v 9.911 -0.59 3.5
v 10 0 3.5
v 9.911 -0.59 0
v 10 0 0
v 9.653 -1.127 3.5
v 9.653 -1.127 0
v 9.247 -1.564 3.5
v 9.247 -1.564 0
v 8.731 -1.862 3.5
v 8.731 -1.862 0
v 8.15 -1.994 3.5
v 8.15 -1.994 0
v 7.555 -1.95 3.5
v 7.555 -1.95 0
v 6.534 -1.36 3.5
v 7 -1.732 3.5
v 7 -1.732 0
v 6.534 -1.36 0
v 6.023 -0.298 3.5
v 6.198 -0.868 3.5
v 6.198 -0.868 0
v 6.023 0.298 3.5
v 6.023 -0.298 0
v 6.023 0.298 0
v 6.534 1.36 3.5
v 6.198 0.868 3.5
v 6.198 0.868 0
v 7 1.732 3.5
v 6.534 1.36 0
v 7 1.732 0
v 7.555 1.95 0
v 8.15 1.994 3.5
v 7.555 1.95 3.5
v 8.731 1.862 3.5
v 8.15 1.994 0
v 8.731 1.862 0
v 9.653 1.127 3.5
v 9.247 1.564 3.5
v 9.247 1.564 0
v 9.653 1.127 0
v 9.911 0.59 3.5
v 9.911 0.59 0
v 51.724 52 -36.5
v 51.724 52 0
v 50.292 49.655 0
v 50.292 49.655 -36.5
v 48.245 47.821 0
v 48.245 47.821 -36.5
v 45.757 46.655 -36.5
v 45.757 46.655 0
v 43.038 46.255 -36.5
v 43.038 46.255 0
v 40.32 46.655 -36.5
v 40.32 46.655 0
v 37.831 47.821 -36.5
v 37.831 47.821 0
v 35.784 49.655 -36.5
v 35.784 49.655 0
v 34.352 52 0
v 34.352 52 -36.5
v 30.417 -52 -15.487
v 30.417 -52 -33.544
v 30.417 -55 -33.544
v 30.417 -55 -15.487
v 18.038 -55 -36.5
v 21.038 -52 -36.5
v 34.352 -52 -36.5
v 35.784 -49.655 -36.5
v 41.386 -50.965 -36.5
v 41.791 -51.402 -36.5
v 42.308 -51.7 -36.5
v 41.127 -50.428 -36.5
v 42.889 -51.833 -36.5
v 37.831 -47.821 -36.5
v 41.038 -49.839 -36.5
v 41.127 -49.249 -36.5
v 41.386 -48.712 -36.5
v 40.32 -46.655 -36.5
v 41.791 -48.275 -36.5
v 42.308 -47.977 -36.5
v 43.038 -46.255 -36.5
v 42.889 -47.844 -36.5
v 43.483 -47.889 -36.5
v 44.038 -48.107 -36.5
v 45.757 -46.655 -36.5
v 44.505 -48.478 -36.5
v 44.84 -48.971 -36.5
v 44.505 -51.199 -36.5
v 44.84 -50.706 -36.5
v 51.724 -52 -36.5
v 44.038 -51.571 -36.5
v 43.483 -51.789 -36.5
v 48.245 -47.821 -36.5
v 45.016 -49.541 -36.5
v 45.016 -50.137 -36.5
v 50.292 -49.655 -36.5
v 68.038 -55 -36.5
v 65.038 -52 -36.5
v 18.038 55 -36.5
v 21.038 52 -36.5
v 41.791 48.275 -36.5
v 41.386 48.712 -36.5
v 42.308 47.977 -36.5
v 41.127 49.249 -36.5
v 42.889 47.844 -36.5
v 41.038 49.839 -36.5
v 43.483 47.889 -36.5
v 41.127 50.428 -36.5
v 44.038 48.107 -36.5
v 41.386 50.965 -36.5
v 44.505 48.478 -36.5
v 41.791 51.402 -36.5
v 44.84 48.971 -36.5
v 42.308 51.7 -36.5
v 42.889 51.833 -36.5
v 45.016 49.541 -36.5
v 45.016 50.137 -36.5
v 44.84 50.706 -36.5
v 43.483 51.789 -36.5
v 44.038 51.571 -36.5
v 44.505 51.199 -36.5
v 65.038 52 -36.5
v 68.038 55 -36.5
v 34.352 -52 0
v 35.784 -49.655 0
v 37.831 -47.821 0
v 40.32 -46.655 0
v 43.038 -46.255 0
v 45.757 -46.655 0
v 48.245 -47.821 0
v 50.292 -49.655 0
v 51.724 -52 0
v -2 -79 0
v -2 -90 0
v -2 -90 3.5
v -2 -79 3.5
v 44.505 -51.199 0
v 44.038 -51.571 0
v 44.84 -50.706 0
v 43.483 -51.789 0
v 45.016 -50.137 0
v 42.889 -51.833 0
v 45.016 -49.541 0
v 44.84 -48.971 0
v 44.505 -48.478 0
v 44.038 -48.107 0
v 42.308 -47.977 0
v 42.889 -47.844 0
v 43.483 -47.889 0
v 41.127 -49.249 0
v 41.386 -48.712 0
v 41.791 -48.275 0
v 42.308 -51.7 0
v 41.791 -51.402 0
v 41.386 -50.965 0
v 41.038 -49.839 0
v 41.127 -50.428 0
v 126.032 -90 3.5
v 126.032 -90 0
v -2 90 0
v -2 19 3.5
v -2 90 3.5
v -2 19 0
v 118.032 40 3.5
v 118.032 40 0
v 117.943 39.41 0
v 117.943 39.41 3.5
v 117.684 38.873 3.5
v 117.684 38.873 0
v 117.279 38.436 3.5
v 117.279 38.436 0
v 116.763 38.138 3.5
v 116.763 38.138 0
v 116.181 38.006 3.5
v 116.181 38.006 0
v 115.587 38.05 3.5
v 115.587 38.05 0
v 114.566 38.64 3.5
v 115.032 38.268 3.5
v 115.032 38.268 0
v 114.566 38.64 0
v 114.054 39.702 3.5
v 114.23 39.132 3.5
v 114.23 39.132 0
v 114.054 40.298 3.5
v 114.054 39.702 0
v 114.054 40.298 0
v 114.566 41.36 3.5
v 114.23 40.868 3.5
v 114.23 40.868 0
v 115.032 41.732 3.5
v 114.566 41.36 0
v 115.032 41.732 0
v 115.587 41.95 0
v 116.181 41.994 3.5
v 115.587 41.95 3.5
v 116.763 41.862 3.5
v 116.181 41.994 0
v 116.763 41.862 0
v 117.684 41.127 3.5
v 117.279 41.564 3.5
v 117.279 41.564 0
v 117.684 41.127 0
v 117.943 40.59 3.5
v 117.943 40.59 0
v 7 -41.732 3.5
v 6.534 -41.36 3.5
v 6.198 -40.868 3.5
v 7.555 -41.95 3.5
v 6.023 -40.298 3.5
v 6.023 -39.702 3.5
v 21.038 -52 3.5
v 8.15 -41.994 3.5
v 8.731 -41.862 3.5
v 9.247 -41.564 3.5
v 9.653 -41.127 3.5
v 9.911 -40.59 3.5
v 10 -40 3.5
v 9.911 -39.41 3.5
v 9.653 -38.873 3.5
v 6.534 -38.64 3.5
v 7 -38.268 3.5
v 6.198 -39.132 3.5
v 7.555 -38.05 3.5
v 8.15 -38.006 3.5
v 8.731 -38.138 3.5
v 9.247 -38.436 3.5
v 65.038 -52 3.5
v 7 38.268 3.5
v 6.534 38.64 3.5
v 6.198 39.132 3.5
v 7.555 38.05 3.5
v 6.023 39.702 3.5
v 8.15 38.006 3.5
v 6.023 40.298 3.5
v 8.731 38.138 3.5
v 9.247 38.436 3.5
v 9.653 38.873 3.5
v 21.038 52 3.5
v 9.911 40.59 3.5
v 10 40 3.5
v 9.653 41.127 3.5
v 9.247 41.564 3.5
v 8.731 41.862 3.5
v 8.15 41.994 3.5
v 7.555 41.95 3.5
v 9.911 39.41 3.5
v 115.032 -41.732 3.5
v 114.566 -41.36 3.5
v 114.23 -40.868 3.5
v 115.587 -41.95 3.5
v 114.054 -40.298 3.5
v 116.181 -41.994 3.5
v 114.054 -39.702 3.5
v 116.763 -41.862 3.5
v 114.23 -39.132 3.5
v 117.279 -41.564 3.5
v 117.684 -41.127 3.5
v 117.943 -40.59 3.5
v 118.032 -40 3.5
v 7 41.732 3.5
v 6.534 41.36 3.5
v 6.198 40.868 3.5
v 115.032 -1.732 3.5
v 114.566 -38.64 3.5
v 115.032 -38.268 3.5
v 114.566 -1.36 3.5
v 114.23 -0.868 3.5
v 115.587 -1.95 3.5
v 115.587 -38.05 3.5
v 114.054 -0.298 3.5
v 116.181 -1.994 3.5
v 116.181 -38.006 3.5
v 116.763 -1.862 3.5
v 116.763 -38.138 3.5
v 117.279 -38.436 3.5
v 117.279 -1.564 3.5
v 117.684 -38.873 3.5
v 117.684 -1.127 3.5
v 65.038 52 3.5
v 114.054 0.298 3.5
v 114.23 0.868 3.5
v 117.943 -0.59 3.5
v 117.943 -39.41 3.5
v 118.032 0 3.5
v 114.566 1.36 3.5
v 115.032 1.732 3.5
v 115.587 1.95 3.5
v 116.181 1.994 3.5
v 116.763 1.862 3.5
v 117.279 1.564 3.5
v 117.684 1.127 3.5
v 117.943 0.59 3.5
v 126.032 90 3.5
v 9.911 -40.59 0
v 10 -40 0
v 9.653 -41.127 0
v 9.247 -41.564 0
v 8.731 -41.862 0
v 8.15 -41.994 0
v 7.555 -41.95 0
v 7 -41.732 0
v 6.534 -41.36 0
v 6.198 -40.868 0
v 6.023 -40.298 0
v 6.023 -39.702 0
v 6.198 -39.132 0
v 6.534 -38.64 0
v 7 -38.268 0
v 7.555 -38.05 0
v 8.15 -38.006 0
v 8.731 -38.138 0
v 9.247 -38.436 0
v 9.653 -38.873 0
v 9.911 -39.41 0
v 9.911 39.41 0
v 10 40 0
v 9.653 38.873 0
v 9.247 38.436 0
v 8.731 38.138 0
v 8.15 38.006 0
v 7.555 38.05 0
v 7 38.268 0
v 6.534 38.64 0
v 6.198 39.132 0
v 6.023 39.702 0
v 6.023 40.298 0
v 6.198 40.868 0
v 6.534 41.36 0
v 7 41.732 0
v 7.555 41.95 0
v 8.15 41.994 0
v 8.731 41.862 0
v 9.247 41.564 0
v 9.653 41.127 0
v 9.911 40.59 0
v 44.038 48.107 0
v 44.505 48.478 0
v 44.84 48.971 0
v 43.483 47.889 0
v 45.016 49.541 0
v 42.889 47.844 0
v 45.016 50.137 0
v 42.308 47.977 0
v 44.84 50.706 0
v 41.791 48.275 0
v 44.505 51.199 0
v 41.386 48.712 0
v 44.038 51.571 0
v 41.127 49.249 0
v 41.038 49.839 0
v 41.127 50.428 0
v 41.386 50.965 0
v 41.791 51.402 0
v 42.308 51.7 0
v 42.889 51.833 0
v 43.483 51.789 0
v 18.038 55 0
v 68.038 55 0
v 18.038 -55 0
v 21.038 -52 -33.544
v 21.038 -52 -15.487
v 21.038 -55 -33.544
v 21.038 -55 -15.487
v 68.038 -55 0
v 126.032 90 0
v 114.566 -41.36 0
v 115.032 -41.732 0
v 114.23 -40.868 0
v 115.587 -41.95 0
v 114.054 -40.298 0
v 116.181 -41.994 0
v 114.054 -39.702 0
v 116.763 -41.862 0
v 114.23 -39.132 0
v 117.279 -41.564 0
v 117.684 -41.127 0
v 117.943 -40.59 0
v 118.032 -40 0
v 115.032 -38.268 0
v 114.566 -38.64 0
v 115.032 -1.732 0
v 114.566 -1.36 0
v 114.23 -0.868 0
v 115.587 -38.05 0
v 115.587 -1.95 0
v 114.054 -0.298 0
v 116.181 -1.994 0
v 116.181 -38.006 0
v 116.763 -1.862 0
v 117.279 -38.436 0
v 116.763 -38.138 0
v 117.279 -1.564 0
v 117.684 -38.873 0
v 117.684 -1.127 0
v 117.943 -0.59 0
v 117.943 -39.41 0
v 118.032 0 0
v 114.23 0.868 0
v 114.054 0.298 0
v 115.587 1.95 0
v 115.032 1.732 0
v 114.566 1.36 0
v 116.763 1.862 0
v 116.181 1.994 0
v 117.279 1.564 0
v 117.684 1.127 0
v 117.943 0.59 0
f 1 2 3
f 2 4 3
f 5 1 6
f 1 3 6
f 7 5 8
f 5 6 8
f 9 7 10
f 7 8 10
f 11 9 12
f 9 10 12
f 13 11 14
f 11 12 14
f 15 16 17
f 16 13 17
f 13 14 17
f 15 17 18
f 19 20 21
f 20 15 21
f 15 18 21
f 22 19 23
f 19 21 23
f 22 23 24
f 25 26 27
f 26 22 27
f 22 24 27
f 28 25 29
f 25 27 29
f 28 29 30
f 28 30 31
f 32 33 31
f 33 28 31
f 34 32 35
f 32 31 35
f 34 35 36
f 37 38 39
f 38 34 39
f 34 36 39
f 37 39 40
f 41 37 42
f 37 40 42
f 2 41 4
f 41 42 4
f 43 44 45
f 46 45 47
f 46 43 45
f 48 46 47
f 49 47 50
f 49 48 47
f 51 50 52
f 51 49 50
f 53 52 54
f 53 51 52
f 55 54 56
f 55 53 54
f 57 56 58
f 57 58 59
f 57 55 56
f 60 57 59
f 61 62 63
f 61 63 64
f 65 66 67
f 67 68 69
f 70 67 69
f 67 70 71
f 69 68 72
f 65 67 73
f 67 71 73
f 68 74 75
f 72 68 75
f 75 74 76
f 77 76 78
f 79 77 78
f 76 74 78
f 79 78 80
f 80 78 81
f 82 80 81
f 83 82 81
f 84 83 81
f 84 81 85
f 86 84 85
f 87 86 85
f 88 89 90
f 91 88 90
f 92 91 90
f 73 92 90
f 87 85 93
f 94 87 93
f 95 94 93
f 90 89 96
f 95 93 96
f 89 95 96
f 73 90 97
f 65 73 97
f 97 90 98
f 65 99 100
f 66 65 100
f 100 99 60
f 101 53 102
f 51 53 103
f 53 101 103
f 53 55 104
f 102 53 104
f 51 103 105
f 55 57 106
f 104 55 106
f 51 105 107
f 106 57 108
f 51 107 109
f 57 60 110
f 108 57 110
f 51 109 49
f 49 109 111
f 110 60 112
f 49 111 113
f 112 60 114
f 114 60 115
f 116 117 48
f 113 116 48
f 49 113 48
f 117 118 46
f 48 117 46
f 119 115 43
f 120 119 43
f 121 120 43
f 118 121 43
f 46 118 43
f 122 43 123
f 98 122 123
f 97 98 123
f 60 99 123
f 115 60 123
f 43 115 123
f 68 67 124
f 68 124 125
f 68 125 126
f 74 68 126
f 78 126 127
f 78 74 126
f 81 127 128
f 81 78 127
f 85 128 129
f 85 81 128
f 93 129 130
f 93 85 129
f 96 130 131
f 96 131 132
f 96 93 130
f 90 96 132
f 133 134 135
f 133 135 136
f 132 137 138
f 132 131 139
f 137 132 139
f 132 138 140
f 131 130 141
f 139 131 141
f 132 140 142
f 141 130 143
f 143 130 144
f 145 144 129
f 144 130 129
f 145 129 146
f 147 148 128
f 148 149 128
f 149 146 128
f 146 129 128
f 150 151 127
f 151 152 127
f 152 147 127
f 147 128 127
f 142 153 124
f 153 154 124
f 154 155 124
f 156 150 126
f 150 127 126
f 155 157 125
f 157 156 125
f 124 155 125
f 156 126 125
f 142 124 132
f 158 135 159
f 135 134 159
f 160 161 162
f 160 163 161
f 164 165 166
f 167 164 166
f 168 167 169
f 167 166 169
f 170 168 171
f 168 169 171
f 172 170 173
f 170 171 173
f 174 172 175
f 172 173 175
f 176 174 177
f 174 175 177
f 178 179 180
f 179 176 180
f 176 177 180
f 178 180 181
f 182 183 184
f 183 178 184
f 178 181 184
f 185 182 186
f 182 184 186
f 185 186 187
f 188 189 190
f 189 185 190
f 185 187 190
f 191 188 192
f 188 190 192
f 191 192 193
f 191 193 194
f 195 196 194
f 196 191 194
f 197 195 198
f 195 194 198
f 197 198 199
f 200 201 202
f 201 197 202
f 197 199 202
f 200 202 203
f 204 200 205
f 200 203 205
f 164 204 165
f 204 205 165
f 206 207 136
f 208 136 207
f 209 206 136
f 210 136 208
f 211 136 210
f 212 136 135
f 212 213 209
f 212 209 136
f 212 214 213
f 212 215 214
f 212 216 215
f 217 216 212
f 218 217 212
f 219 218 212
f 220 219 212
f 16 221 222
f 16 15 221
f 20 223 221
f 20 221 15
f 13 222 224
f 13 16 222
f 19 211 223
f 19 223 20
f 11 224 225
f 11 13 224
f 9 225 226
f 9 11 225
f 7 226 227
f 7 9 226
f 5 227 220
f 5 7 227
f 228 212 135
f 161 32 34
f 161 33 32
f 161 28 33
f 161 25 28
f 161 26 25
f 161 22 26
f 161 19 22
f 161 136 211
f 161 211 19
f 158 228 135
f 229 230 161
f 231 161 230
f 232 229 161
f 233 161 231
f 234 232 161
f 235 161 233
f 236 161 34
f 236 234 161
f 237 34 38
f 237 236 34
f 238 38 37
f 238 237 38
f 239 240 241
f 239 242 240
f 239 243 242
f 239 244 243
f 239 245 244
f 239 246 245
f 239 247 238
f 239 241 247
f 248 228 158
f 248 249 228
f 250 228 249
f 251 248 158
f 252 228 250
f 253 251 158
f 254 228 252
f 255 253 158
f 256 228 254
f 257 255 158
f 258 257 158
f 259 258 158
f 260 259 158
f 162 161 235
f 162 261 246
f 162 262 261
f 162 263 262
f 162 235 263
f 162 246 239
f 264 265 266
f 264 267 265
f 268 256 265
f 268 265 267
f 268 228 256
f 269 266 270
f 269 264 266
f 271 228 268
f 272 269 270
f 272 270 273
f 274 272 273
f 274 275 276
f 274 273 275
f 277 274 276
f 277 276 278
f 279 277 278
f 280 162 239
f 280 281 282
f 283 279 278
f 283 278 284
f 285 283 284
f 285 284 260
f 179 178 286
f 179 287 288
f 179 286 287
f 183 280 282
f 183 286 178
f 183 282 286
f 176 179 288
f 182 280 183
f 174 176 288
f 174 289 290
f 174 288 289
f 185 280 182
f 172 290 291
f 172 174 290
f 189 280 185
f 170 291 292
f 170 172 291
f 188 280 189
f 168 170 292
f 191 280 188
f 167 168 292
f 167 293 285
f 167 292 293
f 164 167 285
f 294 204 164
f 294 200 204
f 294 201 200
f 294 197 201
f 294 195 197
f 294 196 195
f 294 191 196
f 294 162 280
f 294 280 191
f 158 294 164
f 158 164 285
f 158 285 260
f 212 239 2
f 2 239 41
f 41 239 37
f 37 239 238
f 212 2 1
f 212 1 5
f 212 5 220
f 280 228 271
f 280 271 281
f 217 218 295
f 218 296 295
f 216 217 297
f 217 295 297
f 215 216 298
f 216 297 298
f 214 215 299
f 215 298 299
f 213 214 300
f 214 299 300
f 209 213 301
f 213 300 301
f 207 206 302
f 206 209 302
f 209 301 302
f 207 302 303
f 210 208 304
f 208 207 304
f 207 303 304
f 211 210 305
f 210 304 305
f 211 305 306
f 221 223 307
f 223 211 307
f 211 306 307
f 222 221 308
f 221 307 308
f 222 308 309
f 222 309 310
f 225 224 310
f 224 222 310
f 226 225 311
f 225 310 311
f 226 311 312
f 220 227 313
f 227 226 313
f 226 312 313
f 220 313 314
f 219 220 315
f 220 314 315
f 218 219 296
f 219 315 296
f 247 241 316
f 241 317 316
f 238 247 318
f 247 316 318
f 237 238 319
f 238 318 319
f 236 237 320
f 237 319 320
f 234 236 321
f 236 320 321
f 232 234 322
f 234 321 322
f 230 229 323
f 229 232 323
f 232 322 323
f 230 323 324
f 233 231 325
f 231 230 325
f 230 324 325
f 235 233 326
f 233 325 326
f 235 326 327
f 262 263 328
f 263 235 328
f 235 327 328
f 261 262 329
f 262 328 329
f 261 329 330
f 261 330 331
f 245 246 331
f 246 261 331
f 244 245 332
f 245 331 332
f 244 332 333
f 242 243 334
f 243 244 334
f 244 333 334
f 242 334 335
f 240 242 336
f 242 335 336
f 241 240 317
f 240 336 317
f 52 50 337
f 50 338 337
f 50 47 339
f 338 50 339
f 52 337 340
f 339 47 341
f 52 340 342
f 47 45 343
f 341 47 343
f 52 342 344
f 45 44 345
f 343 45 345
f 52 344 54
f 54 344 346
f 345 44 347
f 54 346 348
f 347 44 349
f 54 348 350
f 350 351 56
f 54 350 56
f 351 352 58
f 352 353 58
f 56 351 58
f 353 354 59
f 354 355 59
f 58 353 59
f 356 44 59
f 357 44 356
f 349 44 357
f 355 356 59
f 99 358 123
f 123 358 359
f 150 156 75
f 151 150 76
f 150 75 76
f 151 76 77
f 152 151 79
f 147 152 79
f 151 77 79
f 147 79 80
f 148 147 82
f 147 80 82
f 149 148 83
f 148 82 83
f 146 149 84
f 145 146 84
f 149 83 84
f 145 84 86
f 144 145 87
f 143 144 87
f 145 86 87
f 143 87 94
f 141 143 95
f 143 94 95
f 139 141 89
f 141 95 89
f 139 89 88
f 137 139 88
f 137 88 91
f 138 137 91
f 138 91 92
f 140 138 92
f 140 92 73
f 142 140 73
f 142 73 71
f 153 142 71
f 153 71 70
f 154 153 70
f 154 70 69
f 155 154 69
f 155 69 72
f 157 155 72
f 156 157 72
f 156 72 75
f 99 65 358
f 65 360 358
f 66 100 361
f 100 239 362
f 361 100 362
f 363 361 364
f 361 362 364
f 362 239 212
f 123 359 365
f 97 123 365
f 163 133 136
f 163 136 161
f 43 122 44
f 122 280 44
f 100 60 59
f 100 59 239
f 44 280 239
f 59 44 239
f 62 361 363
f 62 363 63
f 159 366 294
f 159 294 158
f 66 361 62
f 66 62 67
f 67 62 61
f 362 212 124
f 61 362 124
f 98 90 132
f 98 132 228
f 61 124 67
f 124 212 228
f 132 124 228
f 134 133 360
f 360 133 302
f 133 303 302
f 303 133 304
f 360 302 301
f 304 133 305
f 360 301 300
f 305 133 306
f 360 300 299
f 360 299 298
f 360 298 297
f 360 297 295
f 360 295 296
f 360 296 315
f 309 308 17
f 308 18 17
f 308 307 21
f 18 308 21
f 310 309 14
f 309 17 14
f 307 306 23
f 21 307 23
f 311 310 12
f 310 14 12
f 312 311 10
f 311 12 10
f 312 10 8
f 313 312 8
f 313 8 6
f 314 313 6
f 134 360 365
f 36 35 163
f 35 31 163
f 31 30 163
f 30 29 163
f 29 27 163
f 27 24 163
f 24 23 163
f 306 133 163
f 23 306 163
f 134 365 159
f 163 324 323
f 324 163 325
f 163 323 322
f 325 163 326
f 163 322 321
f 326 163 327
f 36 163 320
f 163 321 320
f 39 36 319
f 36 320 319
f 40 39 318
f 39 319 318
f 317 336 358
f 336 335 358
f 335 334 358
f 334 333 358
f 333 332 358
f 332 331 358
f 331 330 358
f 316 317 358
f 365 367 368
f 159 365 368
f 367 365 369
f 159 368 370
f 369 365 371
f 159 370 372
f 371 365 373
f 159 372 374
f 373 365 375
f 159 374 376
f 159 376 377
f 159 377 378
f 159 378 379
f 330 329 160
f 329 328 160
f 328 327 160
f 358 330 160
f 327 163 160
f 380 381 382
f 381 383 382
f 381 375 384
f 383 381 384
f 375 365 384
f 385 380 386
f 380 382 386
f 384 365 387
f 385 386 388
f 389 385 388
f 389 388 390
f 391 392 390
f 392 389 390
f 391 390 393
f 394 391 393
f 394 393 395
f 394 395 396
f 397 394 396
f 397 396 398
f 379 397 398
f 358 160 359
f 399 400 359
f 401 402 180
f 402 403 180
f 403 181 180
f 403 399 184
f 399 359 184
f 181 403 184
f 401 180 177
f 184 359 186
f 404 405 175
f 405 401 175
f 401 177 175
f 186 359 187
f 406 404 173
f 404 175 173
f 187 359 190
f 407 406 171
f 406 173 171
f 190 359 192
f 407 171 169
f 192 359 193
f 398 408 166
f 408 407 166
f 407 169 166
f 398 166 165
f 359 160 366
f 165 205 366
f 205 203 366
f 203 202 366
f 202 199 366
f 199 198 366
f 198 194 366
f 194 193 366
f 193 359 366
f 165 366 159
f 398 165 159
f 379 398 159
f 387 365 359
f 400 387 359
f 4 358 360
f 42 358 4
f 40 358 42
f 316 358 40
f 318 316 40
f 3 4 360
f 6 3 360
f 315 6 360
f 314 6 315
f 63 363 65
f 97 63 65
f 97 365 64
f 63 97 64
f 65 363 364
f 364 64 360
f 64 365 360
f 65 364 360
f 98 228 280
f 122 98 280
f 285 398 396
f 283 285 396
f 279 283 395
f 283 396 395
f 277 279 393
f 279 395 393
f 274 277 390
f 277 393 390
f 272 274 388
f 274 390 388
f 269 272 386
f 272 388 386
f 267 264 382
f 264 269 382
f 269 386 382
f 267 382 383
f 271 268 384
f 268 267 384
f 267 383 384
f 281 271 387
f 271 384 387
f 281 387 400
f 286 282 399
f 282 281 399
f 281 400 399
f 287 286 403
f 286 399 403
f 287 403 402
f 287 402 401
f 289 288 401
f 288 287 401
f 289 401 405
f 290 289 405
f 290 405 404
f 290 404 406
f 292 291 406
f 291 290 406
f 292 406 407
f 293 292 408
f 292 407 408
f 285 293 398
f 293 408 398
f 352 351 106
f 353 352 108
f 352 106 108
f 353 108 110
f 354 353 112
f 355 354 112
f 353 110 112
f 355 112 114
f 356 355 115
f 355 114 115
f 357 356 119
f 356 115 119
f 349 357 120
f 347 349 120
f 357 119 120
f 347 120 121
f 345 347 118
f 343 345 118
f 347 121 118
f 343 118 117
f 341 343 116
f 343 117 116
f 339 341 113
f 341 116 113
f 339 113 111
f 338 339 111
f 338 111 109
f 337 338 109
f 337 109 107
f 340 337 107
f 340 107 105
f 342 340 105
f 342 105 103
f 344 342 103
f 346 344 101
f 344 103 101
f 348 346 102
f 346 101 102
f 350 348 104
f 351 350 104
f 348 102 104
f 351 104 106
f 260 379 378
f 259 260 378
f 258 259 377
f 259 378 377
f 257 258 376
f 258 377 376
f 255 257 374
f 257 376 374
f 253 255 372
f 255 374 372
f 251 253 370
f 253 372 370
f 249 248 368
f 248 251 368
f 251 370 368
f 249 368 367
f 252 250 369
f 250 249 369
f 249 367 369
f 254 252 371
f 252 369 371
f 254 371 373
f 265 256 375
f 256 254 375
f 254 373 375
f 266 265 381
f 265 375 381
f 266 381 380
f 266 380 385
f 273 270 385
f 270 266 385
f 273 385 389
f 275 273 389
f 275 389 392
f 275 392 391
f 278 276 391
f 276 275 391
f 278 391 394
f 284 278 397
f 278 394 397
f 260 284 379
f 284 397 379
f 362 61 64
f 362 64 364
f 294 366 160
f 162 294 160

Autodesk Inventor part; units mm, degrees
ref_plane "YZ Plane" through (0, 0, 0) normal (1, 0, 0) x (0, 1, 0)
ref_plane "XZ Plane" through (0, 0, 0) normal (0, 1, 0) x (-1, 0, 0)
ref_plane "XY Plane" through (0, 0, 0) normal (0, 0, 1) x (1, 0, 0)
sketch "Эскиз1" plane through (0, 0, 0) normal (0, 0, 1) x (1, 0, 0)
  line L0 (126.0318, 90) -> (126.0318, -90) projected
  line L1 (-2.0004, 19) -> (-2.0004, 90) projected
  circle A0 centre (8.0003, 40) radius 2 projected
  circle A1 centre (8.0003, 0) radius 2 projected
  circle A2 centre (8.0003, -40) radius 2 projected
  circle A3 centre (116.0319, 40) radius 2 projected
  circle A4 centre (116.0319, 0) radius 2 projected
  circle A5 centre (116.0319, -40) radius 2 projected
  line L2 (-2, -79) -> (-2, 19) projected
  line L3 (-2.0004, -90) -> (-2.0004, -79) projected
  line L4 (126.0318, 90) -> (-2.0004, 90)
  line L5 (-2.0004, 90) -> (-2.0004, -90)
  line L6 (-2.0004, -90) -> (126.0318, -90)
  line L7 (126.0318, -90) -> (126.0318, 90)
  line L8 (68.0384, 55) -> (18.0384, 55)
  line L9 (18.0384, 55) -> (18.0384, -55)
  line L10 (18.0384, -55) -> (68.0384, -55)
  line L11 (68.0384, -55) -> (68.0384, 55)
  point P0 (0, 0)
  dimension "d0" = 50
  dimension "d1" = 110
  dimension "d2" = 180
  dimension "d3" = 35
extrude "Выдавливание1" add sketch "Эскиз1" along normal blind 3.5
sketch "Эскиз2" plane through (0, 0, 3.5) normal (0, 0, 1) x (1, 0, 0)
  line L0 (18.0384, -55) -> (18.0384, 55) projected
  line L1 (18.0384, 55) -> (68.0384, 55) projected
  line L2 (68.0384, 55) -> (68.0384, -55) projected
  line L3 (68.0384, -55) -> (18.0384, -55) projected
  line L4 (65.0384, 52) -> (21.0384, 52)
  line L5 (21.0384, 52) -> (21.0384, -52)
  line L6 (21.0384, -52) -> (65.0384, -52)
  line L7 (65.0384, -52) -> (65.0384, 52)
  point P0 (0, 0)
  dimension "d6" = 3
  dimension "d7" = 3
  dimension "d8" = 3
  dimension "d9" = 3
extrude "Выдавливание2" add sketch "Эскиз2" against normal blind 40
sketch "Эскиз3" plane through (0, 0, -36.5) normal (0, 0, -1) x (-1, 0, 0)
  line L0 (-65.0384, -52) -> (-21.0384, -52) projected
  arc A0 (-34.3523, -52) -> (-51.7245, -52) centre (-43.0384, -55.6937) ccw
  circle A1 centre (-43.0384, -49.8387) radius 2
  line L1 (0, 0) -> (-84.8604, 0) construction
  arc A2 (-51.7245, 52) -> (-34.3523, 52) centre (-43.0384, 55.6937) ccw
  circle A3 centre (-43.0384, 49.8387) radius 2
  line L2 (-34.3523, -52) -> (-51.7245, -52)
  line L3 (-51.7245, 52) -> (-34.3523, 52)
  line L4 (-21.0384, 52) -> (-65.0384, 52) projected
  dimension "d12" = 44
  dimension "d13" = 22
  dimension "d14" = 4
extrude "Выдавливание3" add sketch "Эскиз3" against normal blind 36.5
sketch "Эскиз4" plane through (21.0384, -52, 3.5) normal (0, 1, 0) x (1, 0, 0)
  line L0 (0, 0) -> (0, 40) projected
  line L1 (0, 37.0435) -> (9.3788, 37.0435)
  line L2 (9.3788, 37.0435) -> (9.3788, 18.9873)
  line L3 (9.3788, 18.9873) -> (0, 18.9873)
  line L4 (0, 18.9873) -> (0, 37.0435)
  point P0 (-21.0384, 3.5)
extrude "Выдавливание4" cut sketch "Эскиз4" against normal blind 4
equation "\"d3\" = -0.5 * d1 + 0.5 * d2"
properties part number "battery_case"
